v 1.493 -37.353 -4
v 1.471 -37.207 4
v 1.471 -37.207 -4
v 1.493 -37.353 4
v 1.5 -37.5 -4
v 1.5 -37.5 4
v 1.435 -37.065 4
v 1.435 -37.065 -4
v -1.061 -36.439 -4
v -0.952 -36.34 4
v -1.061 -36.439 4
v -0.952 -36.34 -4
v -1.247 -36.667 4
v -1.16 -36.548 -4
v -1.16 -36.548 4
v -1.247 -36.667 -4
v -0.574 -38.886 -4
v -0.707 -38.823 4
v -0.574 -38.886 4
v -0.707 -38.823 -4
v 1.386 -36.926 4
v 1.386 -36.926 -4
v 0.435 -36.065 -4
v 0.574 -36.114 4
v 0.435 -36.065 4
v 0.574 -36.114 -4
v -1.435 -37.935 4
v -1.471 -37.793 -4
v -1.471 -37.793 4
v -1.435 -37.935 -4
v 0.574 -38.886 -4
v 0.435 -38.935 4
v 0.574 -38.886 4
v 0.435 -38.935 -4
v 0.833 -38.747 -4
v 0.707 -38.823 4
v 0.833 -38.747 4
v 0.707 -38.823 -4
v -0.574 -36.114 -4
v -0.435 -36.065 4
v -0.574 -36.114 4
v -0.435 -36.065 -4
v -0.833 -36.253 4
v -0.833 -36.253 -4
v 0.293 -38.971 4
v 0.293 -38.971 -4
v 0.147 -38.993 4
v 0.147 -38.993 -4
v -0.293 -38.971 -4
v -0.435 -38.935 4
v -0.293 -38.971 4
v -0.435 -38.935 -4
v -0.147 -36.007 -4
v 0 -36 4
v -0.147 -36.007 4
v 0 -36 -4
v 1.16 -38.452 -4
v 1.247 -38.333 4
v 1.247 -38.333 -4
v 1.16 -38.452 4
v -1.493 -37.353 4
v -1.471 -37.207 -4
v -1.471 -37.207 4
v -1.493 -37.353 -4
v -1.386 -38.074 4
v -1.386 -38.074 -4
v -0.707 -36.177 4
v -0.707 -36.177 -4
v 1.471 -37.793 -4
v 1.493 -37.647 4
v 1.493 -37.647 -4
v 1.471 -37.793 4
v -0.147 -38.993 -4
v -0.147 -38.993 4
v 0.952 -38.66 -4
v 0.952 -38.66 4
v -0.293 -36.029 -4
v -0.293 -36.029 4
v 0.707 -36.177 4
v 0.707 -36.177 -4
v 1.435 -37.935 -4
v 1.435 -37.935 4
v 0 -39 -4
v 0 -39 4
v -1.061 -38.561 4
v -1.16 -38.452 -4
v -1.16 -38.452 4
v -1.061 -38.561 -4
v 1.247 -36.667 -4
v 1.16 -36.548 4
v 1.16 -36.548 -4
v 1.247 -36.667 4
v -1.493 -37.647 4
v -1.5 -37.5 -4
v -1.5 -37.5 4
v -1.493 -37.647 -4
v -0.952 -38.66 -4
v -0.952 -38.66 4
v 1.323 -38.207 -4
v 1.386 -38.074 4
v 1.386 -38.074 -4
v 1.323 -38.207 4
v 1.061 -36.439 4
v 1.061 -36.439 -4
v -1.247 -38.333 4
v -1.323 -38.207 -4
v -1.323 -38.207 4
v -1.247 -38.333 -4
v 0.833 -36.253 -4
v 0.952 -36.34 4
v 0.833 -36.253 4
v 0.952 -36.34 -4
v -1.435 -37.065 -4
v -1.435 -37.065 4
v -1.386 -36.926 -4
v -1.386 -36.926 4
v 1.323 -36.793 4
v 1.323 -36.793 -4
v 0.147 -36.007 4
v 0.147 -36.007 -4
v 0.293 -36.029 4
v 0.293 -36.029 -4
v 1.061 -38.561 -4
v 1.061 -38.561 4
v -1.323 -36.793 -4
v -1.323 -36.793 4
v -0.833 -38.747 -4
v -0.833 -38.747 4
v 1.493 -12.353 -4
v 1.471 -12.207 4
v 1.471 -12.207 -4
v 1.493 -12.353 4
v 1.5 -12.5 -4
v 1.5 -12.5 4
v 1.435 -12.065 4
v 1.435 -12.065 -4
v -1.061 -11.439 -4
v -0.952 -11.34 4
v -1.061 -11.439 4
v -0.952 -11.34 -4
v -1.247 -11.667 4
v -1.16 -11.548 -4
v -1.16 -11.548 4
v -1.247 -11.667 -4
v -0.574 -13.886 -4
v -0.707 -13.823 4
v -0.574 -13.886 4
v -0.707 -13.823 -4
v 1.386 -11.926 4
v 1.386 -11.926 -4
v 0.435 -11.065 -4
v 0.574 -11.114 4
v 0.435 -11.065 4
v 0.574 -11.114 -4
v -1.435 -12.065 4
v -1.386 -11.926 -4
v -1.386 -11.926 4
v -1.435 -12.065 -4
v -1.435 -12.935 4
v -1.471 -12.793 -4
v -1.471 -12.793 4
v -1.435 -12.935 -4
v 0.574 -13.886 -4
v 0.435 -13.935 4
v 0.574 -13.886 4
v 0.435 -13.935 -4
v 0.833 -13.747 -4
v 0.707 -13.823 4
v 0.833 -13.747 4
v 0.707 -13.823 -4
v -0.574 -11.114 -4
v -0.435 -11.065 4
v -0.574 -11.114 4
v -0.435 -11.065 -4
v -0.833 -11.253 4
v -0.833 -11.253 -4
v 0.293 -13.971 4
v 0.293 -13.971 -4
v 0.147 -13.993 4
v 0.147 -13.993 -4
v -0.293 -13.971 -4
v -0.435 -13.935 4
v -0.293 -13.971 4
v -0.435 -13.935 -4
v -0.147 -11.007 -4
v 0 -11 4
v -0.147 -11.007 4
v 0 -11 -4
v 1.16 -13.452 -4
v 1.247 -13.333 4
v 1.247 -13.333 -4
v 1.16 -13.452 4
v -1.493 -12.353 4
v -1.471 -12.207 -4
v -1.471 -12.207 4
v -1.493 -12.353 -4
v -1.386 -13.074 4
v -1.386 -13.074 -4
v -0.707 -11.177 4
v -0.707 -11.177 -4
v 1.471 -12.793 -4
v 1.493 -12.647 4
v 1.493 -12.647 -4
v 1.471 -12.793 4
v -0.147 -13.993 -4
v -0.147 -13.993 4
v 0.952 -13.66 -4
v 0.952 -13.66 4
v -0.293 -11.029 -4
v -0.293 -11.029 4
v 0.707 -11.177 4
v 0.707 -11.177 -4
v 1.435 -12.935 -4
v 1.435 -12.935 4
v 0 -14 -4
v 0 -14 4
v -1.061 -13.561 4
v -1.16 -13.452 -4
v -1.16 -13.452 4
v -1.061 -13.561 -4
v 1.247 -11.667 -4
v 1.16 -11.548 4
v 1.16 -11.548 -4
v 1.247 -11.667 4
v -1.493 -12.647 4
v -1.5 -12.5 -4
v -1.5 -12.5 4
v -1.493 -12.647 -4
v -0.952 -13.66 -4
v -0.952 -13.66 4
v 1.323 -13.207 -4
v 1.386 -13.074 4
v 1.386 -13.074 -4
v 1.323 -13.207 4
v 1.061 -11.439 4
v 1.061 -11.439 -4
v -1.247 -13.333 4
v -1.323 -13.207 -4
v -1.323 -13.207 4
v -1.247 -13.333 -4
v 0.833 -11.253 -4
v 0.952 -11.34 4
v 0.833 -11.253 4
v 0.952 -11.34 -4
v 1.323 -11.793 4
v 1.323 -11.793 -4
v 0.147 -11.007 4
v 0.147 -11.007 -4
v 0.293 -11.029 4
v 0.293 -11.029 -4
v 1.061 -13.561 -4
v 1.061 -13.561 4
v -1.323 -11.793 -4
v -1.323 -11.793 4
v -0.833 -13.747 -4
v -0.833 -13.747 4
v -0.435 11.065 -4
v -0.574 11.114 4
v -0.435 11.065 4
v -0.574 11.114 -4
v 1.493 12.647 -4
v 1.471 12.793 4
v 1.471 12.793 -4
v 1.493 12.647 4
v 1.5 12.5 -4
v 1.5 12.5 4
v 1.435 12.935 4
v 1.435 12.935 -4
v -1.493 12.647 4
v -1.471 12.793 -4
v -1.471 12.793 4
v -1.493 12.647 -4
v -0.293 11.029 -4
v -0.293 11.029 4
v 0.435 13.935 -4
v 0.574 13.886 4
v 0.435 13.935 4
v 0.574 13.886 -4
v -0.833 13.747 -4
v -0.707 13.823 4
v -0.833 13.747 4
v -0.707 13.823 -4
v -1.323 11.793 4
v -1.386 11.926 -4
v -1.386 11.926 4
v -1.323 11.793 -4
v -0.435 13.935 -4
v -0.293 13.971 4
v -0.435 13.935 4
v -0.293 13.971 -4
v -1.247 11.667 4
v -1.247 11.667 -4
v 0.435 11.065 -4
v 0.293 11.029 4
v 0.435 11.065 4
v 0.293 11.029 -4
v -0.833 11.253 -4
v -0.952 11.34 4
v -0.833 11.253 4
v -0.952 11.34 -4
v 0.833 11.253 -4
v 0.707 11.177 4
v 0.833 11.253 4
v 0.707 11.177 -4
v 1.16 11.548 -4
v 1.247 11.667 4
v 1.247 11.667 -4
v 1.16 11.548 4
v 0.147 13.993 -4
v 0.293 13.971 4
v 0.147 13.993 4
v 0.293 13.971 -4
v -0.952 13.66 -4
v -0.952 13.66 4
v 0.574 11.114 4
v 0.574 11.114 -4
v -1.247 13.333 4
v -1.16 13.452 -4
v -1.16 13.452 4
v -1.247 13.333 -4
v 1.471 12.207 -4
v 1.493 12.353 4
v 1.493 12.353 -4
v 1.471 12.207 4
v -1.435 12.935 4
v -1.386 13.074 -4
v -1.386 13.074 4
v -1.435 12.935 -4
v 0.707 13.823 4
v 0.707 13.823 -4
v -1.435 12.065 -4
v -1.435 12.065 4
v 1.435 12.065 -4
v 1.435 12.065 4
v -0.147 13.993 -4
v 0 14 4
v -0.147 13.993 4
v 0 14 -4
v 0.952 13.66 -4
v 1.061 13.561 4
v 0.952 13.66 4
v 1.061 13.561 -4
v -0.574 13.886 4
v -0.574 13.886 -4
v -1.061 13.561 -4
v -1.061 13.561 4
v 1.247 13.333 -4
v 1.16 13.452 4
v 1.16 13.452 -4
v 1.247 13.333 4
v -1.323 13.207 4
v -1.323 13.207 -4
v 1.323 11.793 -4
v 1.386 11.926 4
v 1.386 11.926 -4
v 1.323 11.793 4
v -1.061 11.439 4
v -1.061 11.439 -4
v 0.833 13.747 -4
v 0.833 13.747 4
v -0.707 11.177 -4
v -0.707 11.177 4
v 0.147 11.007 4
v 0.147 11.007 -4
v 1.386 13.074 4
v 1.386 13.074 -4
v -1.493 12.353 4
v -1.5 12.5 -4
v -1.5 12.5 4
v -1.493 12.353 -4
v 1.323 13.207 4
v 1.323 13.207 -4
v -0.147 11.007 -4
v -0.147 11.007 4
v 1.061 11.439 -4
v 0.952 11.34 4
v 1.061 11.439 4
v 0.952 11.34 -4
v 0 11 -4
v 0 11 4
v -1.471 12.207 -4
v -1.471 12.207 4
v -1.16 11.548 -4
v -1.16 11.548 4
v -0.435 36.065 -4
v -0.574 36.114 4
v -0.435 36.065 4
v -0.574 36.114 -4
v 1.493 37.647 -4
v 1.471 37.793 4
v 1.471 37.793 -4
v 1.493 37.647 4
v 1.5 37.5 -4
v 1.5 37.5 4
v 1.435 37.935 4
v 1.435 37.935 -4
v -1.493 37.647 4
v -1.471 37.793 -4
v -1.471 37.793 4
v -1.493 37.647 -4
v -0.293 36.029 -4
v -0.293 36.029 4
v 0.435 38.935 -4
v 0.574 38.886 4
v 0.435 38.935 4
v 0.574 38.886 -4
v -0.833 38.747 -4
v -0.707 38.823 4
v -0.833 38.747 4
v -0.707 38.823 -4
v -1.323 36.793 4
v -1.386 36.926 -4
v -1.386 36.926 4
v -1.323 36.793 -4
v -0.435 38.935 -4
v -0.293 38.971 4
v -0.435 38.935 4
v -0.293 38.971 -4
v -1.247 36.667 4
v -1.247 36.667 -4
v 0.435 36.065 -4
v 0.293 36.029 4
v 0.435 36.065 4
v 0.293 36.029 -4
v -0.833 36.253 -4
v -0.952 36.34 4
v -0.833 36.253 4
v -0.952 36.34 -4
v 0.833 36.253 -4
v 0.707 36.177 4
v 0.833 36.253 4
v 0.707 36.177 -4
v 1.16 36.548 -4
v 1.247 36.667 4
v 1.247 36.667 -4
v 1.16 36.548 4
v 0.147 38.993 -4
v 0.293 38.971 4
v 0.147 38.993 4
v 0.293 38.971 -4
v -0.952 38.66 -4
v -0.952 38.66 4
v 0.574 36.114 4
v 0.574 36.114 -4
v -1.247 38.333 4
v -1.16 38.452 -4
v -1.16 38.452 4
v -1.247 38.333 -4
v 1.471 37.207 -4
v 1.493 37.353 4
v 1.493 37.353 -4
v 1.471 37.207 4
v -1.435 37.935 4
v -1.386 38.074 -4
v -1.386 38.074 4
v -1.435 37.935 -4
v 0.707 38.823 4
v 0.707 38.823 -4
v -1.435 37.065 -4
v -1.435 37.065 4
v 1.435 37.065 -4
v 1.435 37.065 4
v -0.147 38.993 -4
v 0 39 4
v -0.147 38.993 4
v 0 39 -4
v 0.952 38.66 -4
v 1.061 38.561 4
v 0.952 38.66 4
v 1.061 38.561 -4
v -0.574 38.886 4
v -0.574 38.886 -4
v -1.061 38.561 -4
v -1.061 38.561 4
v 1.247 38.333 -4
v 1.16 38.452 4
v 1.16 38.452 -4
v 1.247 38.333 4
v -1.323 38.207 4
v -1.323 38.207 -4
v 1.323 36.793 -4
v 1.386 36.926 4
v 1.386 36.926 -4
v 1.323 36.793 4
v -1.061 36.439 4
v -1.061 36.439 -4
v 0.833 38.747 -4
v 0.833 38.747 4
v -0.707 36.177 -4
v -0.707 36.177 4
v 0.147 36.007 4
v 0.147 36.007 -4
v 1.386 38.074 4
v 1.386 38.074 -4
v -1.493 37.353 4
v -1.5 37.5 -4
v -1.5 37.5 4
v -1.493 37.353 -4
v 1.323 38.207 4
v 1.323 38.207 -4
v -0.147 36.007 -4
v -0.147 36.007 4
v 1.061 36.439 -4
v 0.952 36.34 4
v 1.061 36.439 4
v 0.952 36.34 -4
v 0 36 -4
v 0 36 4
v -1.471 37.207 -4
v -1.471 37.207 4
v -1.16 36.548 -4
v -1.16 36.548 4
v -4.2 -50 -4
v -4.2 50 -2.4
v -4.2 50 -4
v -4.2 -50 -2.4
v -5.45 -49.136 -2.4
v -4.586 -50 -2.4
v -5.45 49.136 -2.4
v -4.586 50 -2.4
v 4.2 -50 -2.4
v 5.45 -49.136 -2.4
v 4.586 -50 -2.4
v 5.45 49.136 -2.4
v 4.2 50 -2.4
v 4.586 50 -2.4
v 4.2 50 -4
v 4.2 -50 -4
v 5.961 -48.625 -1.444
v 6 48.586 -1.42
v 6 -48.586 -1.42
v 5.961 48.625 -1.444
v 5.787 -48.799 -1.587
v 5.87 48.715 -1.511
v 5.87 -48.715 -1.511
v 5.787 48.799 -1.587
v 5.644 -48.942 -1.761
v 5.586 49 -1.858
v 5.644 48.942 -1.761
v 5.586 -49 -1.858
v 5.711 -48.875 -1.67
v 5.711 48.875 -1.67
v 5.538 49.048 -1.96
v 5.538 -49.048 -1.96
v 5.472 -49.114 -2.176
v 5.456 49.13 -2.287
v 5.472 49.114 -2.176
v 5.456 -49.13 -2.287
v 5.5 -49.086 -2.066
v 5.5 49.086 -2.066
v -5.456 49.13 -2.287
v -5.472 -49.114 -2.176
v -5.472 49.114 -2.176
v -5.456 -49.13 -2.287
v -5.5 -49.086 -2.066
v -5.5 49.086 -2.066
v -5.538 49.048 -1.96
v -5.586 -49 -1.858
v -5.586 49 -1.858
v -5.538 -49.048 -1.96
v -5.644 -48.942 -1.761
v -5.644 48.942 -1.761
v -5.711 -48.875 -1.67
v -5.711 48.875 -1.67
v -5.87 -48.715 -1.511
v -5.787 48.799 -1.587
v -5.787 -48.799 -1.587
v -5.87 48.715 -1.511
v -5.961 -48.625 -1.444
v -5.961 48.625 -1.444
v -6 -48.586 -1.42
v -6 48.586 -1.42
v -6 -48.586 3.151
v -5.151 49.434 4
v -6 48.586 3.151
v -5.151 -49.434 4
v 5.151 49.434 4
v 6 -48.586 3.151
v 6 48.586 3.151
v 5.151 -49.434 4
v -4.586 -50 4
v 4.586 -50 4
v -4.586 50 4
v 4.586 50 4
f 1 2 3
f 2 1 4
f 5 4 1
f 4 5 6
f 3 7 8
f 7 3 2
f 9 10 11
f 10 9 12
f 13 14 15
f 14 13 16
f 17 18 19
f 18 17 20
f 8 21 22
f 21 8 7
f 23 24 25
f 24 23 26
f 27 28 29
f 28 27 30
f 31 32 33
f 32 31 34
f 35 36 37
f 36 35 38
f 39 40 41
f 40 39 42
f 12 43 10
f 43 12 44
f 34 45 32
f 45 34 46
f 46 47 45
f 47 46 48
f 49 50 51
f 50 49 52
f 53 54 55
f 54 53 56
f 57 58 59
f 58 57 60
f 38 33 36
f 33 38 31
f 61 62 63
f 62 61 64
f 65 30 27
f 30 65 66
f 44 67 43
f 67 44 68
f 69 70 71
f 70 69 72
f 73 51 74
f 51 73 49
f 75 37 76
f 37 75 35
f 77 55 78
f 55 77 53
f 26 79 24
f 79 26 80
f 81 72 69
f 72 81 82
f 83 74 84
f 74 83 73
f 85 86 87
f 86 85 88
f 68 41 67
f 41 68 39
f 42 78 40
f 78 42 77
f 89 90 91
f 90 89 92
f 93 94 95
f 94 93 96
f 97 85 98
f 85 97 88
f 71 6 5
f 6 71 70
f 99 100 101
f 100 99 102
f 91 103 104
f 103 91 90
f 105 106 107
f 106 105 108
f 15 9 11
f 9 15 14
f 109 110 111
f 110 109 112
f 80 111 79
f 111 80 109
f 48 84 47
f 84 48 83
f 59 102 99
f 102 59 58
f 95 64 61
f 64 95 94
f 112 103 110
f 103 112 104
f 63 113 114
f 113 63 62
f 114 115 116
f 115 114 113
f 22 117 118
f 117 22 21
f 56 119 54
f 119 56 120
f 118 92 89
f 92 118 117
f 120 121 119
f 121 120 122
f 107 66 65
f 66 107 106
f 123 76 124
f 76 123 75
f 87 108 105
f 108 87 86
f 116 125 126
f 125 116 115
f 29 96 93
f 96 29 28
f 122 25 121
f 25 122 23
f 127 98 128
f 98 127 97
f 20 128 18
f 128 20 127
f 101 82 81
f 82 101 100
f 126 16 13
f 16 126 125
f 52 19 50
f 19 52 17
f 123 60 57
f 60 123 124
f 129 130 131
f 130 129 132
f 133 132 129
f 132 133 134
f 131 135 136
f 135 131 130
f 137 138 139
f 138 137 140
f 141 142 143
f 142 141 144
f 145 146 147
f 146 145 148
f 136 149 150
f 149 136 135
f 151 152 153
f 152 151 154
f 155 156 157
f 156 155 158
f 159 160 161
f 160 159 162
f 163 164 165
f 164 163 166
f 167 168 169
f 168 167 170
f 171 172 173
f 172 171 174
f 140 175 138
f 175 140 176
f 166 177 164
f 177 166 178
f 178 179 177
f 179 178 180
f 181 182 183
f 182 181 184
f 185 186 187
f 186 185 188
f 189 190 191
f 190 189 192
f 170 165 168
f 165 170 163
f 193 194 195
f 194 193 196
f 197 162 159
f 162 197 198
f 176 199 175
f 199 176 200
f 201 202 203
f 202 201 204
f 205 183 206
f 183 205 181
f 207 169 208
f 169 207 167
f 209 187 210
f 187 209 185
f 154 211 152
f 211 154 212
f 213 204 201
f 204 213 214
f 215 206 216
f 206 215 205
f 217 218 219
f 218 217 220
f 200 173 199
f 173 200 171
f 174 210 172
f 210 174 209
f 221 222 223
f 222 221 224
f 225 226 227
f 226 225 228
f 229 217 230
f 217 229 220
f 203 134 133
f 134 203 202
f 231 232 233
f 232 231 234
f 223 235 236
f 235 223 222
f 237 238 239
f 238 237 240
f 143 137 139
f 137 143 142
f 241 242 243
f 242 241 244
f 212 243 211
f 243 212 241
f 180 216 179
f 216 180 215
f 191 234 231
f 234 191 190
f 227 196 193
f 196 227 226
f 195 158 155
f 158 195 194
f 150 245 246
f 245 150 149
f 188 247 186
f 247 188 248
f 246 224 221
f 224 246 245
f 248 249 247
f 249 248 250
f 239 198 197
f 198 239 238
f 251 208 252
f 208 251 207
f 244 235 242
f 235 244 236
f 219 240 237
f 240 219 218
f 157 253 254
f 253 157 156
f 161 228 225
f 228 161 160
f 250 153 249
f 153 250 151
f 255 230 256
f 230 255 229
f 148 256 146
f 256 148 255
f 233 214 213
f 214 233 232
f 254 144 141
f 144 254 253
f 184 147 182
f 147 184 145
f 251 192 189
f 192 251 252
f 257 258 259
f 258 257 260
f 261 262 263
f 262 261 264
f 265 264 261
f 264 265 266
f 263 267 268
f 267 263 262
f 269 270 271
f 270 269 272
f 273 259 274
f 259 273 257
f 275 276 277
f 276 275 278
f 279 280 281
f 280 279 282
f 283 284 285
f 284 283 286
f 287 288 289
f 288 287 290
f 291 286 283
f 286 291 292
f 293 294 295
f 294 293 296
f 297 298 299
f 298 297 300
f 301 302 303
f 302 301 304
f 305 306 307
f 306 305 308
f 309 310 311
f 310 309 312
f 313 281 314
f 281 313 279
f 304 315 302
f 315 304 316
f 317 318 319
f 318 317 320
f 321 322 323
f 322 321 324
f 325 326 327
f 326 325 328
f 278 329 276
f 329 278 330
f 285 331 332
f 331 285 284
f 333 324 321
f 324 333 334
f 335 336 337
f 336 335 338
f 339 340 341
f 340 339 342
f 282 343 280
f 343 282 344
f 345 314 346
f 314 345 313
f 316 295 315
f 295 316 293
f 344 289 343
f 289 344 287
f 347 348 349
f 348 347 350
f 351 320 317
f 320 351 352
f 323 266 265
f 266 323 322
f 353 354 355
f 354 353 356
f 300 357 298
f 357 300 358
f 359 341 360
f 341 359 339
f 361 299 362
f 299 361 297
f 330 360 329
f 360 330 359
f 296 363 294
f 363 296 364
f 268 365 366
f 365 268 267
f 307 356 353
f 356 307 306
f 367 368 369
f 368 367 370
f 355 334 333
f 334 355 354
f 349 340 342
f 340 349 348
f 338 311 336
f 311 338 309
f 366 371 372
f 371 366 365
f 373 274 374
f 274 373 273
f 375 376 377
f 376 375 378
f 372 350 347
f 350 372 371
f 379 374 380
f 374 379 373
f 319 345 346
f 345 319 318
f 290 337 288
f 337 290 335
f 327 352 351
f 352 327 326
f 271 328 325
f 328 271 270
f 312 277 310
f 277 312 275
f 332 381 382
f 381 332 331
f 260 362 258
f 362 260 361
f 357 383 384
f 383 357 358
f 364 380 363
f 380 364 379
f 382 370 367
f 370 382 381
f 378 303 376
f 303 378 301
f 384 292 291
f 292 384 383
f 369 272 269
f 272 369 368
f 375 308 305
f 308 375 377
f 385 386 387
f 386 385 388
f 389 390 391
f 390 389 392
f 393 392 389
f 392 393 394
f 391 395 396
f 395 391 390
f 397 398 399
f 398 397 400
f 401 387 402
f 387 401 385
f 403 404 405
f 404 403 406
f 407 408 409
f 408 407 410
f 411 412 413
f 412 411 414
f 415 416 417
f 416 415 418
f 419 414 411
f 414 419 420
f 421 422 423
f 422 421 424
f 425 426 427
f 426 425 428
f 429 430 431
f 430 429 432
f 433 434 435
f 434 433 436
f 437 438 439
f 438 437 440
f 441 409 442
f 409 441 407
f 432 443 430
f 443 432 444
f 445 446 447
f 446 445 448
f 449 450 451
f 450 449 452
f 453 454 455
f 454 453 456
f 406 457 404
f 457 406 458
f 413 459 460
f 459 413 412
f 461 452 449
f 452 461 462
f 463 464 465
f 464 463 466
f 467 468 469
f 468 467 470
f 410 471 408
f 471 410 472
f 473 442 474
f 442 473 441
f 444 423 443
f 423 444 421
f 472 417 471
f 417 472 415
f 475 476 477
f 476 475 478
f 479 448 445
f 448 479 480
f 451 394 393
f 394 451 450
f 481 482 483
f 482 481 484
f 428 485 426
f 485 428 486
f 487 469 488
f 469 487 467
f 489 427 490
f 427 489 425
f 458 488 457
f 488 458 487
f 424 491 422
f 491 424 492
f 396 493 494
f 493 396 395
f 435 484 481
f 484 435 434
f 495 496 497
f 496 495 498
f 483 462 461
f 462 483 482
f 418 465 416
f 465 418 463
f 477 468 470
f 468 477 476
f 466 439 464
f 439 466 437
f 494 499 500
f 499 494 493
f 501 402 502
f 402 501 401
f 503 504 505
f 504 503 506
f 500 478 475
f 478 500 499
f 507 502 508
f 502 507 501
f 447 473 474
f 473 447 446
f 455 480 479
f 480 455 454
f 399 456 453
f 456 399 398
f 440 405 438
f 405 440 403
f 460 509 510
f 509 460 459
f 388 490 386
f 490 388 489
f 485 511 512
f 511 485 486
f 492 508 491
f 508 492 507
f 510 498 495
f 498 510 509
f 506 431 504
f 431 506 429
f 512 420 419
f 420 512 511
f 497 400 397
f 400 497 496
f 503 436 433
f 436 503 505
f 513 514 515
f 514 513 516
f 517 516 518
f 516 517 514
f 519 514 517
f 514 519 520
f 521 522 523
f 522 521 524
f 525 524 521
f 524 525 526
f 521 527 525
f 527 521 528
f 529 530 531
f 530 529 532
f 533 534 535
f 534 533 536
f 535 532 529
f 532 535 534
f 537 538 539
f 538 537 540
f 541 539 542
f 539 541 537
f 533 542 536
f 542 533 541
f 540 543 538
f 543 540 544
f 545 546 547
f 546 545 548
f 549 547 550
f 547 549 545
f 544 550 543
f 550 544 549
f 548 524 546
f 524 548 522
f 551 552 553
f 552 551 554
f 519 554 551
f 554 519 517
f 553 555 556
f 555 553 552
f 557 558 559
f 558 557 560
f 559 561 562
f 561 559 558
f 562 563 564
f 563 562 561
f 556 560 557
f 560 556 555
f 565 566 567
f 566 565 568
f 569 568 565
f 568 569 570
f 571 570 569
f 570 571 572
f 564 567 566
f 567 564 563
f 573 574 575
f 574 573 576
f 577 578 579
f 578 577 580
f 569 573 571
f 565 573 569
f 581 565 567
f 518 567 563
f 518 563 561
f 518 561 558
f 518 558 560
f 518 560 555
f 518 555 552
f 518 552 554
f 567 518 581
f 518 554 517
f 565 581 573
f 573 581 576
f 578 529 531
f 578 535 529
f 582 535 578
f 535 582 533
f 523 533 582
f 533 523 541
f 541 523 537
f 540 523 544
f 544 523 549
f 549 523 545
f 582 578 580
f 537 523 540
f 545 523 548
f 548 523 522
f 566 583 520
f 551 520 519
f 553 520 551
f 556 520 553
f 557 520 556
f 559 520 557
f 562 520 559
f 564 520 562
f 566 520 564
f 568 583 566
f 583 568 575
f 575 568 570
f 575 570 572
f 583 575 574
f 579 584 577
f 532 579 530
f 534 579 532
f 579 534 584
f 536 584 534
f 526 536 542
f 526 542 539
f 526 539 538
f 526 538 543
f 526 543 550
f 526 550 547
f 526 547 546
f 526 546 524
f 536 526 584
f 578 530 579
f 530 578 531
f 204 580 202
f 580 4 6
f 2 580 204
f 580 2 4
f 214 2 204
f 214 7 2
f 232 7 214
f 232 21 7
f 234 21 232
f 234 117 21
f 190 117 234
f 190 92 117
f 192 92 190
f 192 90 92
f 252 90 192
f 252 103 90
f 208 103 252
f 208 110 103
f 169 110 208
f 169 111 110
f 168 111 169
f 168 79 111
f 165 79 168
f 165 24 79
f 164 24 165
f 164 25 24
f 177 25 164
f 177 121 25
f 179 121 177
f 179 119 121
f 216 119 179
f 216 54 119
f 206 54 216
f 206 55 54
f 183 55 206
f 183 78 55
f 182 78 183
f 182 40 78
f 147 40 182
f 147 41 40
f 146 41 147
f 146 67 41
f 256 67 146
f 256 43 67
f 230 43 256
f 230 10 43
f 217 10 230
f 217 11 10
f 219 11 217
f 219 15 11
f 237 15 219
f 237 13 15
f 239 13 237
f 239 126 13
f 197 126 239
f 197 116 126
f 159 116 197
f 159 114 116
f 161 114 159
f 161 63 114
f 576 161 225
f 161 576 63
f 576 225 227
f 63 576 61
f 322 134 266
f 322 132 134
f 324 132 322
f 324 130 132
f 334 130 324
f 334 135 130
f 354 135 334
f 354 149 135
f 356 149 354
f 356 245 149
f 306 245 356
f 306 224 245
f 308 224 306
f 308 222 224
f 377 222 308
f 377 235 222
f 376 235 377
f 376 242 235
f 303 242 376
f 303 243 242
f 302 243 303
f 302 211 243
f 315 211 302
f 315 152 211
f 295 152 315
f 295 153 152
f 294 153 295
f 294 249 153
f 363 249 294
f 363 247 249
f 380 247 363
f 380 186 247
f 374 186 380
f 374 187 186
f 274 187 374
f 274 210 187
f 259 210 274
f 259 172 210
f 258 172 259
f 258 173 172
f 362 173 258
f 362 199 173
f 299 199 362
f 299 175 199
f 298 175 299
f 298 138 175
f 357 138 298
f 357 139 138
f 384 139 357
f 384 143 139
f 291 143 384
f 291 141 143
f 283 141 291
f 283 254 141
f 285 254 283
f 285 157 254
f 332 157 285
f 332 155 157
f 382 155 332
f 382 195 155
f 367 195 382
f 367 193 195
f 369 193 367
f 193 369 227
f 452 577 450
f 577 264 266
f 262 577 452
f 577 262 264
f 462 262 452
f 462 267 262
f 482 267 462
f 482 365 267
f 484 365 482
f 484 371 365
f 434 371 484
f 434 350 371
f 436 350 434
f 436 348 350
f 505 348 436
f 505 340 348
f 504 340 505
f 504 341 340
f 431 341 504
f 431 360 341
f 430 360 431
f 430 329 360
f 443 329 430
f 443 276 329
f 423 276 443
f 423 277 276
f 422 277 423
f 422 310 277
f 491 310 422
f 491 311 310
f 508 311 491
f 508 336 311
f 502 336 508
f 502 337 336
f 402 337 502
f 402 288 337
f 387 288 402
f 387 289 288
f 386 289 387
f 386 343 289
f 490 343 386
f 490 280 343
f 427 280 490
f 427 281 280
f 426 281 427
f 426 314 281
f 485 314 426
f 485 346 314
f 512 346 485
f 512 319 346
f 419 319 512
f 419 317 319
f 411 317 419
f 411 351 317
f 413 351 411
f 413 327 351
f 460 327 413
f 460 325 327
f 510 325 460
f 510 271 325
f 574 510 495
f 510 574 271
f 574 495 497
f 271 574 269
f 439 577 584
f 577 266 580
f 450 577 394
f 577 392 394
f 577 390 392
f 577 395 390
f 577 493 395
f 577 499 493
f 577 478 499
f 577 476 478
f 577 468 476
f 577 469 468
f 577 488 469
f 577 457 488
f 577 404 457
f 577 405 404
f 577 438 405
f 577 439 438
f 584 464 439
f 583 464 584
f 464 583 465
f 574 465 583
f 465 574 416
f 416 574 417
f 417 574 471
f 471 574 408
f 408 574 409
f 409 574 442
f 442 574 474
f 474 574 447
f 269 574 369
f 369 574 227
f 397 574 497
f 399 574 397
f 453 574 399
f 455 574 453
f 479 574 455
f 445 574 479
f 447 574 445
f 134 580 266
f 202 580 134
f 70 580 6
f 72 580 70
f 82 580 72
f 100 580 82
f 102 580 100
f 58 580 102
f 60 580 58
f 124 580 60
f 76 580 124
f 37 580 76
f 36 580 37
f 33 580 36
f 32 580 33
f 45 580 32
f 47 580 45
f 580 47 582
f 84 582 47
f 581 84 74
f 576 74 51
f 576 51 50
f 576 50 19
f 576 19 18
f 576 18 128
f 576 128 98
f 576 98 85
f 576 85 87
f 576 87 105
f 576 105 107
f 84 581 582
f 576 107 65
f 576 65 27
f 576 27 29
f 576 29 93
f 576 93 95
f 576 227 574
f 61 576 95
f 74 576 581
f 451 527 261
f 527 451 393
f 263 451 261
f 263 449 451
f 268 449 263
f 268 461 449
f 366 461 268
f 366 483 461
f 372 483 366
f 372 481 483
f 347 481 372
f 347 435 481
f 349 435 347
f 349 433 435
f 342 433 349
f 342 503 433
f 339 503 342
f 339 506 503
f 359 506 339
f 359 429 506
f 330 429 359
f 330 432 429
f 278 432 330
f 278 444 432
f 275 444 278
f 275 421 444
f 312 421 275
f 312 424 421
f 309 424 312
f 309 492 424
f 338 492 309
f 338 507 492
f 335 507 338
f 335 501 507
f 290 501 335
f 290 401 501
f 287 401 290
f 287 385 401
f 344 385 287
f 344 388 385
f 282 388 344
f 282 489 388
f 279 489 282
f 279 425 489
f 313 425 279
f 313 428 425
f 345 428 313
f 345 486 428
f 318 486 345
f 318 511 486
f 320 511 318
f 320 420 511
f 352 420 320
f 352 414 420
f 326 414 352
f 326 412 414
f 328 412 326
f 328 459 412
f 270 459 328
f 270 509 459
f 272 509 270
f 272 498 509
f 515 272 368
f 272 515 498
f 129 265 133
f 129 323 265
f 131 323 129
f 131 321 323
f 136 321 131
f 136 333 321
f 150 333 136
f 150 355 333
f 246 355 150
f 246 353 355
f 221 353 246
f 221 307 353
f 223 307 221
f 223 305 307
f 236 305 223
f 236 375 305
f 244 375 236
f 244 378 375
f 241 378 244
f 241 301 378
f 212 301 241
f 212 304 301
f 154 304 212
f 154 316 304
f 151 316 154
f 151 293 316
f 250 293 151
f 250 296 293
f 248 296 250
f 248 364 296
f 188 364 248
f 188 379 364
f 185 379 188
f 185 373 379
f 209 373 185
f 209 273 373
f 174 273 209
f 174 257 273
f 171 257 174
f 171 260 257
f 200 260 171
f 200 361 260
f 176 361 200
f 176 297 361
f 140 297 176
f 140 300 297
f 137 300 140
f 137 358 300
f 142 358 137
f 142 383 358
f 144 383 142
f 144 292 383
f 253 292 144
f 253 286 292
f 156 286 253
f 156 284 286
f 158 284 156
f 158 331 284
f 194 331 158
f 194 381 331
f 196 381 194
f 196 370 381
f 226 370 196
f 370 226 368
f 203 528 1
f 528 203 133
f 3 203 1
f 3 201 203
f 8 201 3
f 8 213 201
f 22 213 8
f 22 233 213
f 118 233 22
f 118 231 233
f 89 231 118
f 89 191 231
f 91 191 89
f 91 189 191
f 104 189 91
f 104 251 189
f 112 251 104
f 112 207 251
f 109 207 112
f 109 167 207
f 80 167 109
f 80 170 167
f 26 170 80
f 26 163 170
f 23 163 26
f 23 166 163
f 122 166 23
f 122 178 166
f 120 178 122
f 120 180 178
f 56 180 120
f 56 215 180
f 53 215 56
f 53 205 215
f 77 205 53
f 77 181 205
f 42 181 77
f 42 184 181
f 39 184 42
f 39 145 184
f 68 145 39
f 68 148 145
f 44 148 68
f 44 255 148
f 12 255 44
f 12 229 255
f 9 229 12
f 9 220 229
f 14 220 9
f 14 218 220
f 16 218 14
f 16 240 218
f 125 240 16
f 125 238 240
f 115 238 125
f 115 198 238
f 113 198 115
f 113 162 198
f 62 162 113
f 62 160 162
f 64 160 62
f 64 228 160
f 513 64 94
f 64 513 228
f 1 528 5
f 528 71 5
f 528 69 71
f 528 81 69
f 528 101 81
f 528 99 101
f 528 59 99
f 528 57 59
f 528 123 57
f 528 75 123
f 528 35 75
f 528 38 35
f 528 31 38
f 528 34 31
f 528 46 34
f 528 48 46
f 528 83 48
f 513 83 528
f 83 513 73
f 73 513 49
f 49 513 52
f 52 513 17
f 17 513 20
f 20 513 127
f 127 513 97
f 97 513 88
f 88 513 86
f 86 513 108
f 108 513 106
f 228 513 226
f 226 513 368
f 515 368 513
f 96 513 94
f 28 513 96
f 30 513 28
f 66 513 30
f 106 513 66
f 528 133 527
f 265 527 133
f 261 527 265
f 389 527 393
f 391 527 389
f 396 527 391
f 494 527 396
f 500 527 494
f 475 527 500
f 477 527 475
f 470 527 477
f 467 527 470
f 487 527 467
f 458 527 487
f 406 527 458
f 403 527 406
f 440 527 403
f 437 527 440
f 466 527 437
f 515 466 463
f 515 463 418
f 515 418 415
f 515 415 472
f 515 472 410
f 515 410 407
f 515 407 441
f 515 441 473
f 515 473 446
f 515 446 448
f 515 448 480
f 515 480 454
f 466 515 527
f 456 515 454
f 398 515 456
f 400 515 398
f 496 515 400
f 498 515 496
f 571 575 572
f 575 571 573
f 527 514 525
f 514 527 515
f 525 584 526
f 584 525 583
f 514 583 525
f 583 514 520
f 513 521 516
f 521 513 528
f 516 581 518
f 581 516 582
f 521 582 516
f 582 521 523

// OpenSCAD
$fn = 64;

// Target overall envelope (must match)
rail_L = 100.0; //[50.0:200.0:1.0]
rail_W = 12.0;  //[6.0:24.0:0.5]
rail_H = 8.0;   //[4.0:16.0:0.5]

// Mounting holes
hole_d = 3.0;          //[1.5:6.0:0.1]
hole_pitch = 25.0;     //[10.0:50.0:1.0]
hole_edge_offset = 12.5; //[5.0:20.0:0.5]  // ensures 4 holes fit on 100mm with 25mm pitch
hole_count = 4;        //[2:8:1]
hole_center_offset_W = 0.0; //[-3.0:3.0:0.1]

// Rail profile features (miniature guide-rail-like)
side_relief_w = 1.2;   //[0.5:2.5:0.1]  // side shoulders
side_relief_h = 1.0;   //[0.5:2.0:0.1]
race_r = 1.15;         //[0.6:1.8:0.05] // raceway groove radius
race_depth = 0.55;     //[0.2:1.2:0.05]
race_z = 1.6;          //[0.8:3.0:0.1]  // height of raceway center above bottom

// Chamfers (implemented as bevel cuts)
edge_chamfer = 0.6;    //[0.2:1.5:0.1]
end_chamfer = 1.0;     //[0.5:3.0:0.1]

// Robust boolean overlap
overlap = 0.6;         //[0.2:2.0:0.1]

// Helpers
function clamp(x, a, b) = min(max(x, a), b);

// Derived / constrained to keep a valid connected solid
srw = clamp(side_relief_w, 0, rail_W/2 - 0.2);
srh = clamp(side_relief_h, 0, rail_H - 0.2);

race_center_x = rail_W/2 - srw - race_r; // keep groove inside shoulder
race_center_x2 = -race_center_x;
race_center_z = clamp(-rail_H/2 + race_z, -rail_H/2 + race_r + 0.2, rail_H/2 - race_r - 0.2);
race_cut_r = race_r;
race_cut_offset = race_cut_r - clamp(race_depth, 0.05, race_cut_r - 0.05); // how far circle center is from surface

module rail_blank() {
    // Base envelope
    cube([rail_W, rail_L, rail_H], center=true);
}

module side_reliefs() {
    // Create shoulders by removing material along both sides near the bottom
    // These cuts are fully inside the envelope and run the full length.
    for (sx = [-1, 1]) {
        translate([sx*(rail_W/2 - srw/2), 0, -rail_H/2 + srh/2])
            cube([srw + 2*overlap, rail_L + 2*overlap, srh + 2*overlap], center=true);
    }
}

module raceways() {
    // Two longitudinal concave grooves (raceways) on the side faces
    // Use cylinders along Y, positioned so they cut into the side faces by race_depth.
    // Right side groove
    translate([ rail_W/2 + race_cut_offset, 0, race_center_z])
        rotate([90, 0, 0])
            cylinder(h=rail_L + 2*overlap, r=race_cut_r, center=true);

    // Left side groove
    translate([-rail_W/2 - race_cut_offset, 0, race_center_z])
        rotate([90, 0, 0])
            cylinder(h=rail_L + 2*overlap, r=race_cut_r, center=true);
}

module mounting_hole(posY) {
    translate([hole_center_offset_W, posY, 0])
        cylinder(h=rail_H + 2*overlap, r=hole_d/2, center=true);
}

module mounting_holes_pattern() {
    for (i = [0:hole_count-1]) {
        mounting_hole(-rail_L/2 + hole_edge_offset + i*hole_pitch);
    }
}

module edge_bevel_cuts() {
    // Bevel all 4 long edges using rotated cubes (45°)
    // Each cut is positioned at the corresponding edge and overlaps slightly.
    for (sx = [-1, 1], sz = [-1, 1]) {
        translate([sx*(rail_W/2), 0, sz*(rail_H/2)])
            rotate([0, 45*sz, 0])
                cube([edge_chamfer*2, rail_L + 2*overlap, edge_chamfer*2], center=true);
    }
}

module end_bevel_cuts() {
    // Bevel the 4 vertical edges at both ends (Y = +/- rail_L/2)
    for (sy = [-1, 1], sx = [-1, 1]) {
        translate([sx*(rail_W/2), sy*(rail_L/2), 0])
            rotate([0, 0, 45*sx])
                cube([end_chamfer*2, end_chamfer*2, rail_H + 2*overlap], center=true);
    }
}

module rail_complete() {
    color("Silver")
    difference() {
        rail_blank();

        // Functional features
        mounting_holes_pattern();
        side_reliefs();
        raceways();

        // Cosmetic/edge features
        edge_bevel_cuts();
        end_bevel_cuts();
    }
}

rail_complete();
